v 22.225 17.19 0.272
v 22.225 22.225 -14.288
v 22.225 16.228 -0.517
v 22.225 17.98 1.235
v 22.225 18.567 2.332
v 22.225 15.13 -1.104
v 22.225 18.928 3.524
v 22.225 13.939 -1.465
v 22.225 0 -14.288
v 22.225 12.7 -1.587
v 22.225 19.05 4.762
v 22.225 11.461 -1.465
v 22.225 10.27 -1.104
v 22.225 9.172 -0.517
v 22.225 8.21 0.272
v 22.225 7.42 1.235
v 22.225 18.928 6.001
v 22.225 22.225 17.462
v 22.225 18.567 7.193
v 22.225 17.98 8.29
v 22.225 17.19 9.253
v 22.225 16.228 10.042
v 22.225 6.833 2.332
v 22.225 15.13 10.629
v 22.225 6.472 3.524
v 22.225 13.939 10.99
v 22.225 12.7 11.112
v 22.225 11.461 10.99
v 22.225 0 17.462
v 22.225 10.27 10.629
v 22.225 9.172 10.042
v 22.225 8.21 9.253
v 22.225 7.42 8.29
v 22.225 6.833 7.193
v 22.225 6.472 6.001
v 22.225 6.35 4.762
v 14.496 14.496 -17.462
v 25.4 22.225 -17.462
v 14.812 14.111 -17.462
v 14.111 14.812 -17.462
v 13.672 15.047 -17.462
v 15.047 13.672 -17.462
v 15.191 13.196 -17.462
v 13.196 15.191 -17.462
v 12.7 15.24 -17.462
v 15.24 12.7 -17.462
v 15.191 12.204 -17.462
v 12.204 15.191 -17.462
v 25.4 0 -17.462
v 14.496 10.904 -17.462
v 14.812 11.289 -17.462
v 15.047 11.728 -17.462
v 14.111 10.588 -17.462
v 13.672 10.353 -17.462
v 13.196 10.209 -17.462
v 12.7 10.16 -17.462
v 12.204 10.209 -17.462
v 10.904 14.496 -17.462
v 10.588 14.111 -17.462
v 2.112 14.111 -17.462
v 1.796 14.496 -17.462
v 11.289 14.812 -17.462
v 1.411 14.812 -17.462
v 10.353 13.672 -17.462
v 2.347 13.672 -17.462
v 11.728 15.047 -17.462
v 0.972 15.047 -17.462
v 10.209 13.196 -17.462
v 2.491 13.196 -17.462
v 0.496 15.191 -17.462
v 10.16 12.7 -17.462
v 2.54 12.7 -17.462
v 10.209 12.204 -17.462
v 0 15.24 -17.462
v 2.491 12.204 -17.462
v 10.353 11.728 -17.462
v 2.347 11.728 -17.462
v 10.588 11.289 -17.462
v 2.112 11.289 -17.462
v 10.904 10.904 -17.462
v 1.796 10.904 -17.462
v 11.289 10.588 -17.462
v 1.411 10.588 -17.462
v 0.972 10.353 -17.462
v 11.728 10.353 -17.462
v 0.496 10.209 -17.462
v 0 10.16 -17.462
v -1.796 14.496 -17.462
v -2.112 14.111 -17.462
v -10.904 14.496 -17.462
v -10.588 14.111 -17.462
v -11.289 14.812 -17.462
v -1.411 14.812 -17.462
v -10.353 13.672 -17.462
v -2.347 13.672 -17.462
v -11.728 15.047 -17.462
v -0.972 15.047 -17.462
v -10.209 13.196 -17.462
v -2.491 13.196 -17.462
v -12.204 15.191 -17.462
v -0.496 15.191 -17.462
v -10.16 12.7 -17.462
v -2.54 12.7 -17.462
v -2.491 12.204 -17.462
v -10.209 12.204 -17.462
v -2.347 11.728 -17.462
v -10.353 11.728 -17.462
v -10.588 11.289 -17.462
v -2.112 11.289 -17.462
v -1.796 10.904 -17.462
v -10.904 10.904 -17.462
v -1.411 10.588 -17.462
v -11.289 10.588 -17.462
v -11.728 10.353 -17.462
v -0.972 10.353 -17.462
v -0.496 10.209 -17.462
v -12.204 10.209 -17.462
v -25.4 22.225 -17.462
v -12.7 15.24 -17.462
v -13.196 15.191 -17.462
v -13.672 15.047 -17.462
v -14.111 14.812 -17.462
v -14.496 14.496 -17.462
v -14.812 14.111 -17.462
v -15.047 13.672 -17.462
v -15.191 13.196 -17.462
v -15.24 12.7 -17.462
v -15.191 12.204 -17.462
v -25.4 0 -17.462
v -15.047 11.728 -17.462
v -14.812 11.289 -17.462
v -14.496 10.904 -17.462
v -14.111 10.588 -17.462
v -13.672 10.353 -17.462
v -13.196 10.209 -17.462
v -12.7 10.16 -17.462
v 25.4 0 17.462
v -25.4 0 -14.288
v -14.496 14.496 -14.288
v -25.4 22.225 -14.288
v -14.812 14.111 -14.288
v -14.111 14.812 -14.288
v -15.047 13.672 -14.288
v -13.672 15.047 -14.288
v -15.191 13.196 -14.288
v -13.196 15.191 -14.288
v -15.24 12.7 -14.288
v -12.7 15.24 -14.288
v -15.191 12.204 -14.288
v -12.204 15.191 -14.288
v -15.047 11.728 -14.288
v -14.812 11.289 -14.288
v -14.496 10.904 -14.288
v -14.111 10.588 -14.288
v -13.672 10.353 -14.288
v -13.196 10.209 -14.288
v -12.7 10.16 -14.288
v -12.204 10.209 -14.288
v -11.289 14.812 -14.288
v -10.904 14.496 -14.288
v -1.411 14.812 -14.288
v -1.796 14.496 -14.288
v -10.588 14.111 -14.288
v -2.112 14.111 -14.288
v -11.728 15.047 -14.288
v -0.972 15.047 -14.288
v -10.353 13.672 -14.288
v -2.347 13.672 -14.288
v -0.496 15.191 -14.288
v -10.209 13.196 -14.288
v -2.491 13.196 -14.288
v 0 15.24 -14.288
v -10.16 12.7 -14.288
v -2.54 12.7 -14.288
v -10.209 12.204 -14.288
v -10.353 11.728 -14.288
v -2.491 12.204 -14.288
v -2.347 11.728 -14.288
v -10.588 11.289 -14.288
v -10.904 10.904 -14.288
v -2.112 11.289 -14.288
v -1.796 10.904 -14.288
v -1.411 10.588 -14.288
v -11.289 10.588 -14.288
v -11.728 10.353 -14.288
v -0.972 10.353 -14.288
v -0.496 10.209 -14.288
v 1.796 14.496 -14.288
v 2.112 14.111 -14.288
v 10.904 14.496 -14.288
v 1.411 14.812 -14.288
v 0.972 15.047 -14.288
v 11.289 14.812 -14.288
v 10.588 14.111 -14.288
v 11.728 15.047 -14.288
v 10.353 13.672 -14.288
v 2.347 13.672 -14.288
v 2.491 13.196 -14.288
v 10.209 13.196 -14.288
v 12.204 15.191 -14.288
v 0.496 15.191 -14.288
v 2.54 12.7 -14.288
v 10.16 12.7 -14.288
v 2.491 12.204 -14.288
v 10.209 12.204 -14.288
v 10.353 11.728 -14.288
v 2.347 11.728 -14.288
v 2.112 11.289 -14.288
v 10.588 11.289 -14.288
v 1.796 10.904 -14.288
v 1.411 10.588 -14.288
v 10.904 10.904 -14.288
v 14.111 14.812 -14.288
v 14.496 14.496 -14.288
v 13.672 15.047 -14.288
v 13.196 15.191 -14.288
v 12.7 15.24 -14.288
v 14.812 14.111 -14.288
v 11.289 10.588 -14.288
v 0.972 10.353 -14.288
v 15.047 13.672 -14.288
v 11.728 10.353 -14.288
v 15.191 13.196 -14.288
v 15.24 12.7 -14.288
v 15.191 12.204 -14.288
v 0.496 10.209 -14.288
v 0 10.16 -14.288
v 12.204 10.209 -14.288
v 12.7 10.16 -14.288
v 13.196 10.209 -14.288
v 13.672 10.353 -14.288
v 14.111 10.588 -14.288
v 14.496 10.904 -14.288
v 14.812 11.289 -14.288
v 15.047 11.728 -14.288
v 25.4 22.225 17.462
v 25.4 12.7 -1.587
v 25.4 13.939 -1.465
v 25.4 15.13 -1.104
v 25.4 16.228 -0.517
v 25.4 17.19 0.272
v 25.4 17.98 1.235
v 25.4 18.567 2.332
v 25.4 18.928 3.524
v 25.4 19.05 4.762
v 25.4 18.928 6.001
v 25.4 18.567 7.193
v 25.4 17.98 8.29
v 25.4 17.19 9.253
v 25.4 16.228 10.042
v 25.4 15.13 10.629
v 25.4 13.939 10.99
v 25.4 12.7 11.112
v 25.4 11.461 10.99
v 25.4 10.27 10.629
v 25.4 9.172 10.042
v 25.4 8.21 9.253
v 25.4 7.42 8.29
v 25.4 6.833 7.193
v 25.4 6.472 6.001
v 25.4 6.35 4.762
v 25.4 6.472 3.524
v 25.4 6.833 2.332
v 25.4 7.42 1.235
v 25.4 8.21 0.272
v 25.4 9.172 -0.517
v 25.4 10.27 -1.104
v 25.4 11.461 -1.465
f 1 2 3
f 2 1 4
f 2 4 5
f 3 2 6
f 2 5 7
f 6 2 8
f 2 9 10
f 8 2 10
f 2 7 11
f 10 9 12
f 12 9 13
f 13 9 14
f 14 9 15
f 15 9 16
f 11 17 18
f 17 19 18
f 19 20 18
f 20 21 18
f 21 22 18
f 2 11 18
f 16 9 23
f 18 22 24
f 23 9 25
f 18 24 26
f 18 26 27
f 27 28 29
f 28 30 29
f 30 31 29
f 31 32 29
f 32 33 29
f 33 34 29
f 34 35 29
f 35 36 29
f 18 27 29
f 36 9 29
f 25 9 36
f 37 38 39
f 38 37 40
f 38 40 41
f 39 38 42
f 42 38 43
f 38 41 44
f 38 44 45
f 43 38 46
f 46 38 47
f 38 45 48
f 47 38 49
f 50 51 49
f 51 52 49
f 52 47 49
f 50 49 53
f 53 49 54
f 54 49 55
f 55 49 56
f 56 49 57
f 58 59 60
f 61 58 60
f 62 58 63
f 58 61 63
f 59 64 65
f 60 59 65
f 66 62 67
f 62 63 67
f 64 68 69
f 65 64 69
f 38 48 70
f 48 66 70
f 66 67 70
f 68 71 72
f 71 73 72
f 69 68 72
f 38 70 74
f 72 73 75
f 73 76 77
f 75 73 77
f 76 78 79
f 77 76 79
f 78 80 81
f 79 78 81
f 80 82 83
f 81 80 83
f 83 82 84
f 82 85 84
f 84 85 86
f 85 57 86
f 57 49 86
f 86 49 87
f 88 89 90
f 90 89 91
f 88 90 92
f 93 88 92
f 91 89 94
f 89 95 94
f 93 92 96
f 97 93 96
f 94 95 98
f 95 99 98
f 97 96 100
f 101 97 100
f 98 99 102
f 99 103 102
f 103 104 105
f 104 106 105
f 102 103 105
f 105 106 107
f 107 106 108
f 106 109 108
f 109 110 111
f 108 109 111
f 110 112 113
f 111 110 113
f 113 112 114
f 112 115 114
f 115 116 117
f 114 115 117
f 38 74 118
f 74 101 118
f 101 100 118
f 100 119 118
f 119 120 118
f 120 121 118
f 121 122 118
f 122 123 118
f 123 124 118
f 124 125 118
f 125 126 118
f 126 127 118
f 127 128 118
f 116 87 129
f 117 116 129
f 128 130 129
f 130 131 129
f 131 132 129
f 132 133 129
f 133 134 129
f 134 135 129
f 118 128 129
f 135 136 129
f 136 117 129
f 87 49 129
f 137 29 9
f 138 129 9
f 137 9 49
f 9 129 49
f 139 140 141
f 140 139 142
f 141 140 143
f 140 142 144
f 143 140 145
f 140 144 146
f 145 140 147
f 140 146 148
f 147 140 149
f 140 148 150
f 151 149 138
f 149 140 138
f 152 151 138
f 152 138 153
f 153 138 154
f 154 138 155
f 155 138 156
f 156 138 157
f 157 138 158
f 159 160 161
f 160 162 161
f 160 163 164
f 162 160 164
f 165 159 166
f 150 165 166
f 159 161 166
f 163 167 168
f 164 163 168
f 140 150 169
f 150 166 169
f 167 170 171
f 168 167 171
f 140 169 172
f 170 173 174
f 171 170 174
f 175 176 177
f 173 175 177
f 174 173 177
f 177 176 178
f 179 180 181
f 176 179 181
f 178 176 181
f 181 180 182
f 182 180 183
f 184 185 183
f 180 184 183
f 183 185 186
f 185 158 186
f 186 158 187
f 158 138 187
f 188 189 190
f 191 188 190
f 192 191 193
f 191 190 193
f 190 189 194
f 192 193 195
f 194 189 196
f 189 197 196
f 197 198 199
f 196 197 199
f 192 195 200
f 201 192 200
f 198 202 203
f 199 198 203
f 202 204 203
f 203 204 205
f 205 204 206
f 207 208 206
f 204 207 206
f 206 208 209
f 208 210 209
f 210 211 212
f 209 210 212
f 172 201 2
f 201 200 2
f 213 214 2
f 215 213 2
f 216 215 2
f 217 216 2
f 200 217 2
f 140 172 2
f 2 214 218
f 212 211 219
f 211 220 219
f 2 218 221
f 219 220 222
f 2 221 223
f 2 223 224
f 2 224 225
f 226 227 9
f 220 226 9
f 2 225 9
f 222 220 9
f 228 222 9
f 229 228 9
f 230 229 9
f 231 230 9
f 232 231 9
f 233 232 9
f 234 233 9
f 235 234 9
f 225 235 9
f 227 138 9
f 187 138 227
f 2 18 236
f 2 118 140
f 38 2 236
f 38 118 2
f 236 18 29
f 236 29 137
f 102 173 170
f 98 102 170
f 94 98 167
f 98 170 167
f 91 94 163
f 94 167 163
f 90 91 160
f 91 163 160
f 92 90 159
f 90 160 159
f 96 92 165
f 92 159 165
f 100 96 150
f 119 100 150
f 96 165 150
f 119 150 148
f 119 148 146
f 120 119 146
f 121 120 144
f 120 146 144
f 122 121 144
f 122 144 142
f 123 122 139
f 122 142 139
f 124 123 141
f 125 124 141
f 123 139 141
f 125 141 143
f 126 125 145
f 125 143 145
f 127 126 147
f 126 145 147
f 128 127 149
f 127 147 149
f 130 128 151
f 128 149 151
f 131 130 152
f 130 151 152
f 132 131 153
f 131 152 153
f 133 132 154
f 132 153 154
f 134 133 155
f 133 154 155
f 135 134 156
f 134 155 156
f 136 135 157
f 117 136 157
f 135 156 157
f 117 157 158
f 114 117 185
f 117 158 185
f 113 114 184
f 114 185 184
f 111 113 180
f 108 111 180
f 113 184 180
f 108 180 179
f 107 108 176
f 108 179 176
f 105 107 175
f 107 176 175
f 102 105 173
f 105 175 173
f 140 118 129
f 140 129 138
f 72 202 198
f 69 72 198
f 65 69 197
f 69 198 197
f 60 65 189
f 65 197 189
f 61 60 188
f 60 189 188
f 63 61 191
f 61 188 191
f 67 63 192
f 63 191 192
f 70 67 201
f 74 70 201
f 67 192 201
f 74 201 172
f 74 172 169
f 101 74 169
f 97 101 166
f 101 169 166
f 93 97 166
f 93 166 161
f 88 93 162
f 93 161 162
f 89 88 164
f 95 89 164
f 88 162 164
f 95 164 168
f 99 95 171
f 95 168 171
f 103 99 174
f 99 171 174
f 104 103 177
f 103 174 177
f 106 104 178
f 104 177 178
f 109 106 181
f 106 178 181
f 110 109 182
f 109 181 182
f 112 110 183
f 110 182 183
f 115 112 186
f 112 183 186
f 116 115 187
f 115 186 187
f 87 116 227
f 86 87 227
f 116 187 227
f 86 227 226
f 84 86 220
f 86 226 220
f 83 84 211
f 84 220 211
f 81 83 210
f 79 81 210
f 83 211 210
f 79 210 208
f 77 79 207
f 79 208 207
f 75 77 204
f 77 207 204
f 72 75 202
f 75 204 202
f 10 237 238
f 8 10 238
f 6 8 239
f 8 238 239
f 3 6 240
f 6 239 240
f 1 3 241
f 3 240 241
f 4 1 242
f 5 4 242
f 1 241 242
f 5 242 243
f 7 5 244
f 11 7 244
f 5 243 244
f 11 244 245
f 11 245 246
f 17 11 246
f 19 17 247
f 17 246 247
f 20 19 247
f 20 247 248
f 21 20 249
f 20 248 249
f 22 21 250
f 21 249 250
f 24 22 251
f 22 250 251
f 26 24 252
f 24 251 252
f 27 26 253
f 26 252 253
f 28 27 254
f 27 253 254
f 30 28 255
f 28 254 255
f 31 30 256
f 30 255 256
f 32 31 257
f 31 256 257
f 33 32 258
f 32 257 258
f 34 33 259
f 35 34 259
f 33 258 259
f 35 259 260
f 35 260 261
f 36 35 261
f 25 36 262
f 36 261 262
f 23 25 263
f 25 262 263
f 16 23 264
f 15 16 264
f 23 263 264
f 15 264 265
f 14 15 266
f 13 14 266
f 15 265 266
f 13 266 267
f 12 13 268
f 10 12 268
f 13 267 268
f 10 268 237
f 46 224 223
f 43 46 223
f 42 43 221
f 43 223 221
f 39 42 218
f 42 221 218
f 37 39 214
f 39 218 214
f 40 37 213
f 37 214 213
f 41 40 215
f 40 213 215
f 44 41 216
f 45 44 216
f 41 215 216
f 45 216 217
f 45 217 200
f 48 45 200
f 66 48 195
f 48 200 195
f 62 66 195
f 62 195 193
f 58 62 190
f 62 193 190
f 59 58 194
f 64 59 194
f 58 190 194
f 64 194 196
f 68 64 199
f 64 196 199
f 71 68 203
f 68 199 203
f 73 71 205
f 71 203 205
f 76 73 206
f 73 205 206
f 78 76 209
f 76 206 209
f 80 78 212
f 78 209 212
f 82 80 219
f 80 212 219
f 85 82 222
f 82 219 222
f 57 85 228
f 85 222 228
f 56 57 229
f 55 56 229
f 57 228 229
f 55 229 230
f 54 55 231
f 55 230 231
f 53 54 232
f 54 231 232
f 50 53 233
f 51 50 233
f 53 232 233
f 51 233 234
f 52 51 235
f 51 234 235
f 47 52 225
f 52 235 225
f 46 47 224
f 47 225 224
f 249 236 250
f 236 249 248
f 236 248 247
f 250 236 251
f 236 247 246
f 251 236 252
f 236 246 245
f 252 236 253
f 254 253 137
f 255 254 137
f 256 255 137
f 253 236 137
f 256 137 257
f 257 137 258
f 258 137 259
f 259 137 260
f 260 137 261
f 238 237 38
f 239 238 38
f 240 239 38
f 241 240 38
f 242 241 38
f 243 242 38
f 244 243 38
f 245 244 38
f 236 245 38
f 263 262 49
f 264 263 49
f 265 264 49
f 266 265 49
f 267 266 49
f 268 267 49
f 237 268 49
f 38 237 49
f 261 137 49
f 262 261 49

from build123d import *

# Parameters (mm, degrees)
BOSS_EXTRUDE1_DEPTH = 22.225
SKETCH2_R           = 6.35
CUT_EXTRUDE1_DEPTH  = 3.175
SKETCH3_R           = 2.54
CUT_EXTRUDE2_DEPTH  = 3.175


with BuildPart() as part:
    # Sketch1 → Boss-Extrude1 (new body)
    with BuildSketch(Plane(origin=(0, 0, 0), x_dir=(1, 0, 0), z_dir=(0, 1, 0))):
        Polygon((22.225, 14.2875), (22.225, -17.4625), (25.4, -17.4625), (25.4, 17.4625), (-25.4, 17.4625), (-25.4, 14.2875), align=None)
    extrude(amount=BOSS_EXTRUDE1_DEPTH)

    # Sketch2 → Cut-Extrude1 (cut)
    with BuildSketch(Plane(origin=(25.4, 0, 0), x_dir=(0, 0, -1), z_dir=(1, 0, 0))):
        with Locations((-4.7625, 12.7)):
            Circle(SKETCH2_R)
    extrude(amount=-CUT_EXTRUDE1_DEPTH, mode=Mode.SUBTRACT)

    # Sketch3 → Cut-Extrude2 (cut)
    with BuildSketch(Plane.XY.offset(-14.2875)):
        with Locations((-12.7, 12.7)):
            Circle(SKETCH3_R)
        with Locations((0, 12.7)):
            Circle(SKETCH3_R)
        with Locations((12.7, 12.7)):
            Circle(SKETCH3_R)
    extrude(amount=-CUT_EXTRUDE2_DEPTH, mode=Mode.SUBTRACT)


solid = part.part
